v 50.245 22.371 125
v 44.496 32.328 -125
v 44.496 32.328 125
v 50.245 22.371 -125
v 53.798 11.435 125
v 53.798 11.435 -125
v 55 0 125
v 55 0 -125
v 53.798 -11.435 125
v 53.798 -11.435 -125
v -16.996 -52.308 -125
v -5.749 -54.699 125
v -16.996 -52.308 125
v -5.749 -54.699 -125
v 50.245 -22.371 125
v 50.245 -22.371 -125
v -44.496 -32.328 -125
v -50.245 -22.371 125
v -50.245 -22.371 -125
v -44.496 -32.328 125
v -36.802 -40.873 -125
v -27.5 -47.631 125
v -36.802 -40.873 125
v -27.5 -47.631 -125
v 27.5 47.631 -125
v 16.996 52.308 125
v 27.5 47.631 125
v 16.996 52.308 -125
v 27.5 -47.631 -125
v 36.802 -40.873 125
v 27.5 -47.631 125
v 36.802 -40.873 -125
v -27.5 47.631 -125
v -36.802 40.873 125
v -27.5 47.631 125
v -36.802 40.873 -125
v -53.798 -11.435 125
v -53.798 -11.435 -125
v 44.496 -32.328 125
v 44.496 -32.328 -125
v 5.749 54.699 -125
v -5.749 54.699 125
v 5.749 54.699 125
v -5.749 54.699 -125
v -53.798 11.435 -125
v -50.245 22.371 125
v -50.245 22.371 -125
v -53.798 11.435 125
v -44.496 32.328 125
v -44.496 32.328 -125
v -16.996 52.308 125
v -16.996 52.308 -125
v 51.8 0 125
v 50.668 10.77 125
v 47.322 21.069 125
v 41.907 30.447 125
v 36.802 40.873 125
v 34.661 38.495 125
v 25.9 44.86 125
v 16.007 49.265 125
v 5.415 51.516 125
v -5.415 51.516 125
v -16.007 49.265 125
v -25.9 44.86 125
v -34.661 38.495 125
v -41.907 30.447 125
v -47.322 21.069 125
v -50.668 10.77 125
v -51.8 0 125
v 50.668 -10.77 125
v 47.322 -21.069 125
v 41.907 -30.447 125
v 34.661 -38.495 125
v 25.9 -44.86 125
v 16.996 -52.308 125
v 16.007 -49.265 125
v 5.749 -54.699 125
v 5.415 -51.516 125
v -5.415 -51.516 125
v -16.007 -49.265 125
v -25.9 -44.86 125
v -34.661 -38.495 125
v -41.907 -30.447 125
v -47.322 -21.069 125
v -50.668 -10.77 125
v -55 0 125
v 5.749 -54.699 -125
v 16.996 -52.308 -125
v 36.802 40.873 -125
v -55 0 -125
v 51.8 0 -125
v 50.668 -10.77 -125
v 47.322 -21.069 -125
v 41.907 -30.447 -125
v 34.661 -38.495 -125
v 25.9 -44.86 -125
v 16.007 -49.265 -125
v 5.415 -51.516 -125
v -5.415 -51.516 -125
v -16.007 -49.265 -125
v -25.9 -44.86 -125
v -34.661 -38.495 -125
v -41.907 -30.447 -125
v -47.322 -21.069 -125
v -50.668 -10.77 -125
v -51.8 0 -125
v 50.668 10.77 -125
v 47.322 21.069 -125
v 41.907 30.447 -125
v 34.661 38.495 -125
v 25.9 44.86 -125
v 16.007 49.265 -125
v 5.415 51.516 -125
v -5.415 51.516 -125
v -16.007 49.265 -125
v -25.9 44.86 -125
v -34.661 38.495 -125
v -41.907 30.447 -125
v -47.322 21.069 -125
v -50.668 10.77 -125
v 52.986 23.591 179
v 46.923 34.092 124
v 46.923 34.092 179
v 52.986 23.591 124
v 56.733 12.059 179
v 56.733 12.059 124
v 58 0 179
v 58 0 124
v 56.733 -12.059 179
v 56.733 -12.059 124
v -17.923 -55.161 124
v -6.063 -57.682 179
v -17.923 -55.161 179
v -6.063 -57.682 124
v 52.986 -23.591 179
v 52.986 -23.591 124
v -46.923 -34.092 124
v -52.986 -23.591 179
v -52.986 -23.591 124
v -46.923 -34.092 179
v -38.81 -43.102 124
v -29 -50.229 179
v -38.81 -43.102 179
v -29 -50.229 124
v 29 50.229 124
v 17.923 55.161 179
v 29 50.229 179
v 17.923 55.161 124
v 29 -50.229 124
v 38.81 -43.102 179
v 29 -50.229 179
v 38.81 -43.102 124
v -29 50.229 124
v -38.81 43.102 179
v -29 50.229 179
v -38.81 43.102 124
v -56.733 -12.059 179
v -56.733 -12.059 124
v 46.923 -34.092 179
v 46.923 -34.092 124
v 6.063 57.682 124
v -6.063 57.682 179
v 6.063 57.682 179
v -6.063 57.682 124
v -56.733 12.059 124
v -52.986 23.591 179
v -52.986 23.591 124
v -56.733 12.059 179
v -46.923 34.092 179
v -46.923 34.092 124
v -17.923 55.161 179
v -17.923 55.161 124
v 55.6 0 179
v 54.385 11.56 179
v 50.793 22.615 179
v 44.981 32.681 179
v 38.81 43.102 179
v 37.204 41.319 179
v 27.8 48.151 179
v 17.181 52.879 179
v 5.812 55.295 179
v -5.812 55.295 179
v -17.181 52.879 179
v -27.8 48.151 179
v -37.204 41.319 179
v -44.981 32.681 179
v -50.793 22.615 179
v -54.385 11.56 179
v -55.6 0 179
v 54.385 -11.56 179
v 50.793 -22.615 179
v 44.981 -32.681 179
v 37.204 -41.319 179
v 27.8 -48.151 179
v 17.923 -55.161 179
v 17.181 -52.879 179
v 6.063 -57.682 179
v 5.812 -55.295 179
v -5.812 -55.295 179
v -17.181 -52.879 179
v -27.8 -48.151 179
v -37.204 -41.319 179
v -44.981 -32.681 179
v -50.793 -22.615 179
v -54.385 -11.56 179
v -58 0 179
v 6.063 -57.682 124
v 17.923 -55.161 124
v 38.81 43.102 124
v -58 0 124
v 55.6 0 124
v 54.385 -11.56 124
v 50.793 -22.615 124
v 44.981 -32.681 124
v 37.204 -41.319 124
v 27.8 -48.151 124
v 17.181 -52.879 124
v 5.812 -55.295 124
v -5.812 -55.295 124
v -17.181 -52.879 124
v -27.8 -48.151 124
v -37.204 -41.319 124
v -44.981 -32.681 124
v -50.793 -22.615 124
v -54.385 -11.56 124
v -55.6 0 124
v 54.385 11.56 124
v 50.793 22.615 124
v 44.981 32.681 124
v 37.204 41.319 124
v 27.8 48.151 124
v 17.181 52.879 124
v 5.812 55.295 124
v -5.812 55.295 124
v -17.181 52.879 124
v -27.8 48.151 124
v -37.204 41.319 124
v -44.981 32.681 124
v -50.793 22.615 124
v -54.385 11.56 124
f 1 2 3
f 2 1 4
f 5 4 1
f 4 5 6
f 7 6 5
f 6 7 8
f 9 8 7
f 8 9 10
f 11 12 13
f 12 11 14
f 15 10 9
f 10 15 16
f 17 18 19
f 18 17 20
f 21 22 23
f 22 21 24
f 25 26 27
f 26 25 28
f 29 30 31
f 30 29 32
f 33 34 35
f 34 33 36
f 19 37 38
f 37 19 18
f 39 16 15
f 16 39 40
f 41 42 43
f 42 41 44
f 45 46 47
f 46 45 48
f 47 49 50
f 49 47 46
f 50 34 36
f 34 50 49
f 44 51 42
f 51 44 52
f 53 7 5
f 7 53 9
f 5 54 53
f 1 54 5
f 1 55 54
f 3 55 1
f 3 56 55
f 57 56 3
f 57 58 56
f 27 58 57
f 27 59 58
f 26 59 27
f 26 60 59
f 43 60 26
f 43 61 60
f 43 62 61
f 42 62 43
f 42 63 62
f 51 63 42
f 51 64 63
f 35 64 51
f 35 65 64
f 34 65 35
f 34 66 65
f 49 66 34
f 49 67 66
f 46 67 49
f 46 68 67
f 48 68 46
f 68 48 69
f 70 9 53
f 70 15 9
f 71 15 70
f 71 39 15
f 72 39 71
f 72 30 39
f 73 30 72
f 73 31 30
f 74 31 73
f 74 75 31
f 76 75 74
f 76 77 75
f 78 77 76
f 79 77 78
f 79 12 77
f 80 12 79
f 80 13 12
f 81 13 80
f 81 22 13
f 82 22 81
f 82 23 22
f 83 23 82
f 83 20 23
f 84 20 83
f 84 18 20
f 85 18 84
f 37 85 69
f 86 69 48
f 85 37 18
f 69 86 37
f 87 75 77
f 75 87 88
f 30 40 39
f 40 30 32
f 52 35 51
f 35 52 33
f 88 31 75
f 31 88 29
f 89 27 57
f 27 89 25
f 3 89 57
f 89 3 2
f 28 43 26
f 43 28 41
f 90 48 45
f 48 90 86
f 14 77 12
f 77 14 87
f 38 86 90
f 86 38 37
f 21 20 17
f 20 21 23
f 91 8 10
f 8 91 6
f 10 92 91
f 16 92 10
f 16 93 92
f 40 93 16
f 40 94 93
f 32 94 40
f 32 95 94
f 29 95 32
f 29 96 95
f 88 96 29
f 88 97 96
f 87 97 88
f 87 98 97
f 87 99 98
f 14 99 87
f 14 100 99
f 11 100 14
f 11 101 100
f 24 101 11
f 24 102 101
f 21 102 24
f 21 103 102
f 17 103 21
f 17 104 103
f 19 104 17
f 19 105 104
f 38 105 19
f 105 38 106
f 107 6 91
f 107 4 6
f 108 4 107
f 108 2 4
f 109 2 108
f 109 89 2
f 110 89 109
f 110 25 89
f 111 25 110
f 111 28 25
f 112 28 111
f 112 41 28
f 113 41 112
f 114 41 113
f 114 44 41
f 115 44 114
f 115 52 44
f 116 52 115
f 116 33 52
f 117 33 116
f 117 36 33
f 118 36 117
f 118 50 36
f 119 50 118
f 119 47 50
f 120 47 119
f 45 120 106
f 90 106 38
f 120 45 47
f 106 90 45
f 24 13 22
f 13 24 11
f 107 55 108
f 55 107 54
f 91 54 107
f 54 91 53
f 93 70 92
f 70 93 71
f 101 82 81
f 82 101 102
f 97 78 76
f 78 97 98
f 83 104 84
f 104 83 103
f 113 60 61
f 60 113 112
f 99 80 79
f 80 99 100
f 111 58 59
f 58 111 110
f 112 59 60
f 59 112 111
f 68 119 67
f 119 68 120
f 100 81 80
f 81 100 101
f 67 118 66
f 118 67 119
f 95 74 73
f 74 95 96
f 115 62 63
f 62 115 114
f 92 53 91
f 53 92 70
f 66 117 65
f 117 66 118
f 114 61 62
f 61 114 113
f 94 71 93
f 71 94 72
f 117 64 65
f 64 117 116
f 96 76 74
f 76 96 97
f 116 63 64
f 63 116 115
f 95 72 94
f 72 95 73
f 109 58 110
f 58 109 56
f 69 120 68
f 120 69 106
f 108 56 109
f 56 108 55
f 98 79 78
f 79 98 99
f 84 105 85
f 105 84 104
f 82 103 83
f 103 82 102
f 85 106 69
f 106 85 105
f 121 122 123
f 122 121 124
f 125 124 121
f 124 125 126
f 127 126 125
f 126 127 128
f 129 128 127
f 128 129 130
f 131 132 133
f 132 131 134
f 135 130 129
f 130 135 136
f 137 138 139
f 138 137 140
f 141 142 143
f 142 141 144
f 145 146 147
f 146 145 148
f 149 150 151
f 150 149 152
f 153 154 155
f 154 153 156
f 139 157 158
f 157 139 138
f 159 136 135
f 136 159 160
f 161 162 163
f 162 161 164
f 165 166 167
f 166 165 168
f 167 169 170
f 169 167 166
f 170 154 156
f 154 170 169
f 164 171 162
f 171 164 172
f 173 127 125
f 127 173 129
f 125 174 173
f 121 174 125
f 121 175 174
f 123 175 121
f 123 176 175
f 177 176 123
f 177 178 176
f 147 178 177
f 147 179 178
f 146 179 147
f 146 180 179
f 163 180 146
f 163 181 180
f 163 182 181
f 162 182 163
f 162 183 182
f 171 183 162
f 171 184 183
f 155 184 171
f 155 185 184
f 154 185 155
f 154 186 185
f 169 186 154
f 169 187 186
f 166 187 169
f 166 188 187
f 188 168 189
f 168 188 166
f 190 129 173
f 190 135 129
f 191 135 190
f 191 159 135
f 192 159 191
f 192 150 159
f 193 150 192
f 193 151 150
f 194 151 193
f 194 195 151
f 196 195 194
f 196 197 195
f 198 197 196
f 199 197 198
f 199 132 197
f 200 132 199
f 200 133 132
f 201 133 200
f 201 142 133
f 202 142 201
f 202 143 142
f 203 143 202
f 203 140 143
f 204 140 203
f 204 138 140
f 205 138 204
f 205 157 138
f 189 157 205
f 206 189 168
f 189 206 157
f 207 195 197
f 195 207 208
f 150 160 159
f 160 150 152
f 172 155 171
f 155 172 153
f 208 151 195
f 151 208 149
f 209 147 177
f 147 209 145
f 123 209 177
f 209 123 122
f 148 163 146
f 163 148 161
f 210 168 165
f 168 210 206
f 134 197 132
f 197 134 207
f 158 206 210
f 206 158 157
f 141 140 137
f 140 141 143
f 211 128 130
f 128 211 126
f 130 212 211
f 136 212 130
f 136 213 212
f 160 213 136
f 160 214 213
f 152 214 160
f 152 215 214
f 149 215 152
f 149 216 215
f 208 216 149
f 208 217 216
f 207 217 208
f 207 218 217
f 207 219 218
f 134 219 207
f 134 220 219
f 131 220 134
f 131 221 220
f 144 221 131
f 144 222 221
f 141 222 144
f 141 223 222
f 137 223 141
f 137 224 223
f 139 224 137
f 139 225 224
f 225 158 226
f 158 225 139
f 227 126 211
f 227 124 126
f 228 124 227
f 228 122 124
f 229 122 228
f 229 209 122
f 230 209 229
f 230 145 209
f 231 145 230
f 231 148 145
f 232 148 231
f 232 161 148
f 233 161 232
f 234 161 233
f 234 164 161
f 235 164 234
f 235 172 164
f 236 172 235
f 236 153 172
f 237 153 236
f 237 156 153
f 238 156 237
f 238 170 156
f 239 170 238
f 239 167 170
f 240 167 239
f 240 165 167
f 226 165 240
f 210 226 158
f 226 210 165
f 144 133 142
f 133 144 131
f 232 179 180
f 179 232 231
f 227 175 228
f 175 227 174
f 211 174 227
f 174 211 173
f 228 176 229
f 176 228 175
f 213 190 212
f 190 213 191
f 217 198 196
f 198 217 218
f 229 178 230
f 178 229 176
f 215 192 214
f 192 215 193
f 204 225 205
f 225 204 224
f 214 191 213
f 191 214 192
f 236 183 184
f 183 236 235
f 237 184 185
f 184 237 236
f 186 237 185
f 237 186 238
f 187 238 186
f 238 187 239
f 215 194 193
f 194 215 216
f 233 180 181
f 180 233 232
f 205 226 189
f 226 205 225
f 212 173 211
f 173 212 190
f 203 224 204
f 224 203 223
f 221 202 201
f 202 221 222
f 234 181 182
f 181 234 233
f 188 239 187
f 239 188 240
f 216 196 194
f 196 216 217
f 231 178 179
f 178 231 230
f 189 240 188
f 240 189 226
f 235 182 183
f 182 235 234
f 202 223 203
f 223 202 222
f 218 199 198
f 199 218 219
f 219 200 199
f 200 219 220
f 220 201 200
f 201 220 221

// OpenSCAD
// Parameters
pipe_standard = 1; //[1:1:1]
nominal_diameter_mm = 110; //[50:200:1]
length_mm = 250; //[125:500:1]
pipe_od_mm = 110; //[55:220:0.5]
pipe_wall_mm = 3.2; //[1.6:6.4:0.1]
include_end_fitting = 1; //[0:1:1]
fitting_length_mm = 55; //[25:110:1]
fitting_wall_extra_mm = 2.0; //[0.5:6.0:0.1]
fitting_od_extra_mm = 6.0; //[2.0:20.0:0.5]
socket_clearance_mm = 0.6; //[0.2:1.5:0.1]
overlap_mm = 1.0; //[0.5:2.0:0.1]

// Module for the hollow tube
module hollow_tube() {
  difference() {
    cylinder(h=length_mm, r=pipe_od_mm/2, center=true);
    translate([0, 0, -overlap_mm])
      cylinder(h=length_mm + 2*overlap_mm, r=pipe_od_mm/2 - pipe_wall_mm, center=true);
  }
}

// Module for the end fitting
module end_fitting() {
  if (include_end_fitting) {
    difference() {
      translate([0, 0, length_mm/2 + fitting_length_mm/2 - overlap_mm])
        cylinder(h=fitting_length_mm, r=pipe_od_mm/2 + fitting_od_extra_mm/2, center=true);
      translate([0, 0, length_mm/2 + fitting_length_mm/2 - overlap_mm])
        cylinder(h=fitting_length_mm + 2*overlap_mm, r=pipe_od_mm/2 + socket_clearance_mm, center=true);
    }
  }
}

// Main module for the HT pipe
module ht_pipe() {
  color([0.85, 0.85, 0.8]) { // Off-white for PVC
    union() {
      hollow_tube();
      end_fitting();
    }
  }
}

// Assembly
module assembly() {
  ht_pipe();
}

assembly();
